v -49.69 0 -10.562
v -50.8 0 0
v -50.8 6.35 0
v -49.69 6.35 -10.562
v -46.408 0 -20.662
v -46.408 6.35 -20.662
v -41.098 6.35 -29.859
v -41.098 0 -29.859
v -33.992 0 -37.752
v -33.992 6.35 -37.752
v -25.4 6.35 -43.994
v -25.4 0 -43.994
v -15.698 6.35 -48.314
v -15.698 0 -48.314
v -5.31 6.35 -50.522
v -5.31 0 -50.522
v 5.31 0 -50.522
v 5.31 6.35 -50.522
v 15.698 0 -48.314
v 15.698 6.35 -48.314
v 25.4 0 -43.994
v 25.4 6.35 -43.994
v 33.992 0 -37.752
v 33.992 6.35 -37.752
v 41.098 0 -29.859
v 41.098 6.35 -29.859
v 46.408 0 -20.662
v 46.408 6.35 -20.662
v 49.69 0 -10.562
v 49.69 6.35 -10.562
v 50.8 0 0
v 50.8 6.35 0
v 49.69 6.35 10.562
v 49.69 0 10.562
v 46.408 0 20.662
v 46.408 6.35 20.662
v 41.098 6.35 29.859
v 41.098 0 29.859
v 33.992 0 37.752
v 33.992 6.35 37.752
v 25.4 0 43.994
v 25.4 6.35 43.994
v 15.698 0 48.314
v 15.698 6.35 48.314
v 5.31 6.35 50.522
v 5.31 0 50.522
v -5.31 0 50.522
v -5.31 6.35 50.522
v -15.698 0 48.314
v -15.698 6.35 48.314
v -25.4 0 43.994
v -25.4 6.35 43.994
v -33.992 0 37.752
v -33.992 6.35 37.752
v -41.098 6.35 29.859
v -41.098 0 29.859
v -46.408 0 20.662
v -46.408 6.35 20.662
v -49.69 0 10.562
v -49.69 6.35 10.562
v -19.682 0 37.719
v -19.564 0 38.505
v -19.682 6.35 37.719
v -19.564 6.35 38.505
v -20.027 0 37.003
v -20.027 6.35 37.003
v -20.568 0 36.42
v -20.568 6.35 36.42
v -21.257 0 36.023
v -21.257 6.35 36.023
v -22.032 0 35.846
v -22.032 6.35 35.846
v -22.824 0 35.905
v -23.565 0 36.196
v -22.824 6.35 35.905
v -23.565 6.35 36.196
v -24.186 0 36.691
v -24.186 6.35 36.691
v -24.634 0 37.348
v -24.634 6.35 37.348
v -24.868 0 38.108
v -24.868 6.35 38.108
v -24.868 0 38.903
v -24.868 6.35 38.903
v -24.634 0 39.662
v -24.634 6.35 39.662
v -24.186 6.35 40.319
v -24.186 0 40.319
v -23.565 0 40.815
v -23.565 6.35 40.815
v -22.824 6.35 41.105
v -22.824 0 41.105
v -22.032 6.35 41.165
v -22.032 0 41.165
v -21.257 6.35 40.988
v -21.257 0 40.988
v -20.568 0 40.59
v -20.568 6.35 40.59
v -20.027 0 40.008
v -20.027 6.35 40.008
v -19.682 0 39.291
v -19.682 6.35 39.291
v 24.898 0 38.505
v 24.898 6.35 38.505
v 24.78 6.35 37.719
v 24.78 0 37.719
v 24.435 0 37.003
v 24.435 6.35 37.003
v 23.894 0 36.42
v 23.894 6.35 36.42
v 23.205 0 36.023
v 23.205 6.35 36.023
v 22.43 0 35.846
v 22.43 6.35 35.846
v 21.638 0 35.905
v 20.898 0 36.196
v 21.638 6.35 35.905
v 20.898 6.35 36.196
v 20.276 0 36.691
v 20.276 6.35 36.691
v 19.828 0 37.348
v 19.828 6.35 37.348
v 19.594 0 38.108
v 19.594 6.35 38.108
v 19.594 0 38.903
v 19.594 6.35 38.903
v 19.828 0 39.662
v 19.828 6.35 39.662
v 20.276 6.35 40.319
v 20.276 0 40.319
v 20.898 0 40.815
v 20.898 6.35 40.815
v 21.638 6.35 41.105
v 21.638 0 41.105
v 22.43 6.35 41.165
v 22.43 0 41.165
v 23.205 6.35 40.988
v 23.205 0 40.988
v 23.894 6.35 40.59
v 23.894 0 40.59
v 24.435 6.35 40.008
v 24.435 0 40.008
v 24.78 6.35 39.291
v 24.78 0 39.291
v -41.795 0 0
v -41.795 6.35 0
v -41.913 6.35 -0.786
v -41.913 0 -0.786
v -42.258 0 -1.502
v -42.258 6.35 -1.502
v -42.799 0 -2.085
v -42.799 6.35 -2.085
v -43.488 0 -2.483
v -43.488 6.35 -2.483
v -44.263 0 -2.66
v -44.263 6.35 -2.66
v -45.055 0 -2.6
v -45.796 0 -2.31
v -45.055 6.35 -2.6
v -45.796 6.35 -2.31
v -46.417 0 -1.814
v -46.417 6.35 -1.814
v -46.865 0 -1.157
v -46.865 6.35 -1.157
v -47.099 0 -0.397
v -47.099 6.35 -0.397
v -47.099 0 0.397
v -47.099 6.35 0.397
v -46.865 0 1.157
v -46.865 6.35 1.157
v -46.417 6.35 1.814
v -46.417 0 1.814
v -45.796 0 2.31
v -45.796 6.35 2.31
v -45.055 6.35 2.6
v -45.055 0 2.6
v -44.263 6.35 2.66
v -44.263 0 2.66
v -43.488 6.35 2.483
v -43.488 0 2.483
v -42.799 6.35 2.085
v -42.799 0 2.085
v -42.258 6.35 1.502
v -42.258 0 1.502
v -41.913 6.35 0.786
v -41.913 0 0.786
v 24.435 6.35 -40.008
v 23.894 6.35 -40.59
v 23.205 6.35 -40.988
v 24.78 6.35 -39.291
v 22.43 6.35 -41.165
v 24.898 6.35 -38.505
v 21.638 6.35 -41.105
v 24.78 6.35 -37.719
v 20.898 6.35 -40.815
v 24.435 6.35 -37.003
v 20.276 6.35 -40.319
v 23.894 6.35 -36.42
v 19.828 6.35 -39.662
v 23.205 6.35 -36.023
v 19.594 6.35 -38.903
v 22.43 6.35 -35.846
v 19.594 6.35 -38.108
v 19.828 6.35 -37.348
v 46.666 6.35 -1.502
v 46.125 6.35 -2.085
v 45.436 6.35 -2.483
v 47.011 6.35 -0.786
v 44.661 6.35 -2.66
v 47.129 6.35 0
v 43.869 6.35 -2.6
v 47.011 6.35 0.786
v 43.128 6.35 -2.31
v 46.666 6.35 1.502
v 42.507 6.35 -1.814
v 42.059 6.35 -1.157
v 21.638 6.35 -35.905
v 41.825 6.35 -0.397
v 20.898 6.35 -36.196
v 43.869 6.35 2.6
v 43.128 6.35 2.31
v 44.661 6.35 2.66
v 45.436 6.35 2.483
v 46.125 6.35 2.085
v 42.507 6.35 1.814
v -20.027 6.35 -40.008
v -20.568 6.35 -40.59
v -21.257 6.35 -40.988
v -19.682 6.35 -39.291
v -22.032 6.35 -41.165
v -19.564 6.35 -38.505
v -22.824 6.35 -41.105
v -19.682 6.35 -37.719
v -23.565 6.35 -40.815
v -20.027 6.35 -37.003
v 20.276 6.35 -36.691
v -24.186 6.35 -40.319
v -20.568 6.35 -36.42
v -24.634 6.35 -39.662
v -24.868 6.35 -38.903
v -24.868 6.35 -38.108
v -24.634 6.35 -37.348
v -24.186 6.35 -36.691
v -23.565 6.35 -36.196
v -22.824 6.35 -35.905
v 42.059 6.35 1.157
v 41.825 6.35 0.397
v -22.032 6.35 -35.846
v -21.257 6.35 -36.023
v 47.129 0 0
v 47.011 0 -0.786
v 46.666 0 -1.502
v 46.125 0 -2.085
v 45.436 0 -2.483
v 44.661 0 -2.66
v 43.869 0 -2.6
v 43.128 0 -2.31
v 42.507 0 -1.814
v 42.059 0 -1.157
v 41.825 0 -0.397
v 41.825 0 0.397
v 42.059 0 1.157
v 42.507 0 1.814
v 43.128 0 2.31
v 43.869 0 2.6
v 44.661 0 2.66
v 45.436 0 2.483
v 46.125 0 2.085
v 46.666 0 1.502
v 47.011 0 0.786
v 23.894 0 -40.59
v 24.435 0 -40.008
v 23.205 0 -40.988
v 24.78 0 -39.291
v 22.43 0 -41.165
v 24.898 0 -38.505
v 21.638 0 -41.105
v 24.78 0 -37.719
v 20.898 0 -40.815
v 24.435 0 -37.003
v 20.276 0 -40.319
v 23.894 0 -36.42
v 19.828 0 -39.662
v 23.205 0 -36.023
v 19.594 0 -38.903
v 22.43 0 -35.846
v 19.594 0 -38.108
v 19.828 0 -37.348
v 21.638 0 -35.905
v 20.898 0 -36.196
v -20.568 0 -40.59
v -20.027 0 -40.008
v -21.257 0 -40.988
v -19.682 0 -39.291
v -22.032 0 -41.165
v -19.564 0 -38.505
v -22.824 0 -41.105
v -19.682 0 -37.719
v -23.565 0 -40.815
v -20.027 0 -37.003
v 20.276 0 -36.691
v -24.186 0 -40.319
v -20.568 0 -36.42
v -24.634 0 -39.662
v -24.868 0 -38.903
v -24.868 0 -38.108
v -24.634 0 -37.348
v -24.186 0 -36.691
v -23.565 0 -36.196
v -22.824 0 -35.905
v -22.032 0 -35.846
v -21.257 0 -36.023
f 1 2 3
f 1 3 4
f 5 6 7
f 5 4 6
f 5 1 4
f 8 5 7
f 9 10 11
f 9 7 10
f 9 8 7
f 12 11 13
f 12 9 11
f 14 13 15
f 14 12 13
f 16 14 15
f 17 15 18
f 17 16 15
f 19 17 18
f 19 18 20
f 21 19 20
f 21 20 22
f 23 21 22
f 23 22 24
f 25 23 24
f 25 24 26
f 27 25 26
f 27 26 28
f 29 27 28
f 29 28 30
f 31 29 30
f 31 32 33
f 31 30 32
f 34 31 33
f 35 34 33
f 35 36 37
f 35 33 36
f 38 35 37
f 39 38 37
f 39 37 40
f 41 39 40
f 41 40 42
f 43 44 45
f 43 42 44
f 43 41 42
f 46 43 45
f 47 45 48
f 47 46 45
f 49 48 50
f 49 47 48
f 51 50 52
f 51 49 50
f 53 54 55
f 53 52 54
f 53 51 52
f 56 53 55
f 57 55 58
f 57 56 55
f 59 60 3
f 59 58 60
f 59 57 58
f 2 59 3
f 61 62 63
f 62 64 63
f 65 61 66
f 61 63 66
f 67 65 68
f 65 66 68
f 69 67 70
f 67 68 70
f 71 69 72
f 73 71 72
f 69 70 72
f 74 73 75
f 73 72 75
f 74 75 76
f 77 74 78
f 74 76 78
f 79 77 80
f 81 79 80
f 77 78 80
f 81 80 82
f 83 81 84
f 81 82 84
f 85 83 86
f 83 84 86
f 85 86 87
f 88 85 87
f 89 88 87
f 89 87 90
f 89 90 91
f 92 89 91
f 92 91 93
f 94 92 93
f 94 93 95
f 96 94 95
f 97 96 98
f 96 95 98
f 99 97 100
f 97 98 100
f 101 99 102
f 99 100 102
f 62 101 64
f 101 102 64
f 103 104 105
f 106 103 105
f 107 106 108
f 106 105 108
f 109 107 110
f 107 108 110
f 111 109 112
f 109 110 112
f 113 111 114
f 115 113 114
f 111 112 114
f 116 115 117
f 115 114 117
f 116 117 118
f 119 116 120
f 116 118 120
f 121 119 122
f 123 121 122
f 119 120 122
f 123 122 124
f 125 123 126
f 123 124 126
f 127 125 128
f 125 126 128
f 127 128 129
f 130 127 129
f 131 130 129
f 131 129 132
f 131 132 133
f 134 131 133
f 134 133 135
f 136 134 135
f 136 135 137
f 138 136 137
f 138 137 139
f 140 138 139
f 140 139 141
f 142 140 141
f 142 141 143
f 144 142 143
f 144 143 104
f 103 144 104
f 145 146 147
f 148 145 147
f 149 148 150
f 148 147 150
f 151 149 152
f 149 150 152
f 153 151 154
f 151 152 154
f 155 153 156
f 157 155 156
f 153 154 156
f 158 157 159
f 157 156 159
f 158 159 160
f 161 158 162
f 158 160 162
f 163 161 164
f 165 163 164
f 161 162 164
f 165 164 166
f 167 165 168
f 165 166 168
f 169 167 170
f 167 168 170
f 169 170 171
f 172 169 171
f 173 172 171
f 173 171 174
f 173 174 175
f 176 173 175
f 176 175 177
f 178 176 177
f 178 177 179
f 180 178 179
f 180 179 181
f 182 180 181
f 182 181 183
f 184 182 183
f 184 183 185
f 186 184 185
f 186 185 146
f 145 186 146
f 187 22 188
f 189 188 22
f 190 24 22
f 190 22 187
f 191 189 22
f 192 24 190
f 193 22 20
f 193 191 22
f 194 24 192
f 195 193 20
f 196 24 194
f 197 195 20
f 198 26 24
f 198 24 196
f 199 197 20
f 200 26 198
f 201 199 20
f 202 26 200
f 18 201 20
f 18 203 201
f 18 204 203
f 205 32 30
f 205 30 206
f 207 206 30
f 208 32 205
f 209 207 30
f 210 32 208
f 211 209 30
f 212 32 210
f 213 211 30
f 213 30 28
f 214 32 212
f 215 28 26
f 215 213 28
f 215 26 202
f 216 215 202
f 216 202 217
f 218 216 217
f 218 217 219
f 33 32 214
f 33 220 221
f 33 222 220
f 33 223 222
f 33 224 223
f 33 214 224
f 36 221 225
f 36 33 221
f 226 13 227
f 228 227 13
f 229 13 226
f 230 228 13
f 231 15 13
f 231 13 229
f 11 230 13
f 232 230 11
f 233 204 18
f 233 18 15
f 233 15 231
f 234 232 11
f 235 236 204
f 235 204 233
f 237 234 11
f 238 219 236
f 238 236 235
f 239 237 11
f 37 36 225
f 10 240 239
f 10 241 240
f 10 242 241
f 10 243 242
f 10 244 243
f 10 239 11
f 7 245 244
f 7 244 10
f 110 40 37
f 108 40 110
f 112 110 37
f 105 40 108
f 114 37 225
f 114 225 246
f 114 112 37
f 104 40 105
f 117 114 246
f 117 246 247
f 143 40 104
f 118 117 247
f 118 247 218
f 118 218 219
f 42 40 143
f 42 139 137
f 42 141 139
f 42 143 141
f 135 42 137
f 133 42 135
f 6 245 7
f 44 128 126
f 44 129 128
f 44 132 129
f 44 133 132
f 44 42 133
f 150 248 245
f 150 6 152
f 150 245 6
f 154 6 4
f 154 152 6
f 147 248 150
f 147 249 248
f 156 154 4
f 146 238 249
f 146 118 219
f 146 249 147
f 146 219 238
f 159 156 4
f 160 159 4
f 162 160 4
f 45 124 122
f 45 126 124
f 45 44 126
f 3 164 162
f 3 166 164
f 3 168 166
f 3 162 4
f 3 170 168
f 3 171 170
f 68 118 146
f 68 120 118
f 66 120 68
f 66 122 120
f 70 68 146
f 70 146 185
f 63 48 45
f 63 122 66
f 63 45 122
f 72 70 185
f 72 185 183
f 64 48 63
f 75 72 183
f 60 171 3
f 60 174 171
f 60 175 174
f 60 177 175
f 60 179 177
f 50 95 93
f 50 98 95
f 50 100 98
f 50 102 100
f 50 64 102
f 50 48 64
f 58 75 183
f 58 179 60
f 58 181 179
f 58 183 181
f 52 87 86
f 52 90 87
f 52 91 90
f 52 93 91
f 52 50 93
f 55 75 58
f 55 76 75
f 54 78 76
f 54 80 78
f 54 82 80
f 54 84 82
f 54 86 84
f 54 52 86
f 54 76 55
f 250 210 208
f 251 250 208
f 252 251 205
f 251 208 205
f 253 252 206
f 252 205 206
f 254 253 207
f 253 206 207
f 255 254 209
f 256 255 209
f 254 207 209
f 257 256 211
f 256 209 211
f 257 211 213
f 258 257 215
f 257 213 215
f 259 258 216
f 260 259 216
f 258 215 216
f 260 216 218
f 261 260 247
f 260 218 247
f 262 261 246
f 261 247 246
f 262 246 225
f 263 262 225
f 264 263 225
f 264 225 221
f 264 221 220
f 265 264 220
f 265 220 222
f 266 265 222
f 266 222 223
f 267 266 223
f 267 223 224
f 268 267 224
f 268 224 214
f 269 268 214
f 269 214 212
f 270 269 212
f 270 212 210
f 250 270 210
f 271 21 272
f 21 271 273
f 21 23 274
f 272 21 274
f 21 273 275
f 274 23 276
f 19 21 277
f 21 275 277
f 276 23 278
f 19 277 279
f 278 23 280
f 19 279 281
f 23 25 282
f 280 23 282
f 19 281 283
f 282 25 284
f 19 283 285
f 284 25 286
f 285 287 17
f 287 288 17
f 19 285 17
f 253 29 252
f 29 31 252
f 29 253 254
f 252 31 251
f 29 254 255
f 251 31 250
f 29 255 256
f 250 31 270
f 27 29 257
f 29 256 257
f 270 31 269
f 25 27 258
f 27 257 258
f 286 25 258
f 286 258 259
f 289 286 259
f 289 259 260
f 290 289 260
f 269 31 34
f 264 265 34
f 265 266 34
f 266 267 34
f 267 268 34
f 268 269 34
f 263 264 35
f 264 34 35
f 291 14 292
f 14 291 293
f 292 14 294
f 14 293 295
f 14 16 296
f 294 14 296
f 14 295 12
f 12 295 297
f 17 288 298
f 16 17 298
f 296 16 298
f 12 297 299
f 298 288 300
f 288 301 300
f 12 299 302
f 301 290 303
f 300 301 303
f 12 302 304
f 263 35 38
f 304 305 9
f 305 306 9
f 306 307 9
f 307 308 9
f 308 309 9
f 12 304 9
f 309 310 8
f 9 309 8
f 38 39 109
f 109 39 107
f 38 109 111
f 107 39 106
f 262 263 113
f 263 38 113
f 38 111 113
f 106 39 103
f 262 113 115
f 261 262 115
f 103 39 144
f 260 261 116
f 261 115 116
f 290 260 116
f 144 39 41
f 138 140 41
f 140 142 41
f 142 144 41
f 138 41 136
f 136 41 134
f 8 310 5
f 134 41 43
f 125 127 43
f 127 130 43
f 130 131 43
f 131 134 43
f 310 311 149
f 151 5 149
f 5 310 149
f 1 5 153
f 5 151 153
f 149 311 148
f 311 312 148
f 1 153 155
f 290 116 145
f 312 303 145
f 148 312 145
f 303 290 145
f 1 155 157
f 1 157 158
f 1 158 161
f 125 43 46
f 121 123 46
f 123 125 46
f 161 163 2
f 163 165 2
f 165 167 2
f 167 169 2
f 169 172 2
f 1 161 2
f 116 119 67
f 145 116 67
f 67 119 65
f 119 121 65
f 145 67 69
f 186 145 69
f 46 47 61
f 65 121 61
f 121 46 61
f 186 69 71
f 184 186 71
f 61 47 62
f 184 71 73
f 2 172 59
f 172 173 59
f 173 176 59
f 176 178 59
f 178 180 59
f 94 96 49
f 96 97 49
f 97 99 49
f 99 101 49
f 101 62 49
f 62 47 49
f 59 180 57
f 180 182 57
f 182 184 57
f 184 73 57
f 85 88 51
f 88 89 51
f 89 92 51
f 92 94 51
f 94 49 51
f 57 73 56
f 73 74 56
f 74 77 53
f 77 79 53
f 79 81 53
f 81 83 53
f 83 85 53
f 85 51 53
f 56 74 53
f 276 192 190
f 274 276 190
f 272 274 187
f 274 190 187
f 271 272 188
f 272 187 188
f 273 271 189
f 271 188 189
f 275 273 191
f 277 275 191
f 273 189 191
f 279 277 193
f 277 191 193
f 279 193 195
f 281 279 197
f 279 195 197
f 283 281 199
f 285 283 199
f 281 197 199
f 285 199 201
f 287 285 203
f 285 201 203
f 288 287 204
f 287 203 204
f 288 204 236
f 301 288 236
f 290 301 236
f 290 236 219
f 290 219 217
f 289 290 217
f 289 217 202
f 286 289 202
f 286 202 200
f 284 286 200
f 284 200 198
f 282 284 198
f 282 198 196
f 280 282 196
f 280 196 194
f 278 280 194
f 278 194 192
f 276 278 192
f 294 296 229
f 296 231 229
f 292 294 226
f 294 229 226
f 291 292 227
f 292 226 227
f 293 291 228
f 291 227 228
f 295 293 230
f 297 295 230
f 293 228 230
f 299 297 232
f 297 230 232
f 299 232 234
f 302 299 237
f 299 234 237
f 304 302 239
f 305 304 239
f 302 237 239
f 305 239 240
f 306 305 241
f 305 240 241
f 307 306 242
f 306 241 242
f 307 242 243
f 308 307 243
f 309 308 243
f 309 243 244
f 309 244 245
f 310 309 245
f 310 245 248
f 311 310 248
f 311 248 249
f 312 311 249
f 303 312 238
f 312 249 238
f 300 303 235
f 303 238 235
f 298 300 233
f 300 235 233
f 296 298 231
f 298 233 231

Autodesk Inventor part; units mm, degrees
ref_plane "YZ Plane" through (0, 0, 0) normal (1, 0, 0) x (0, 1, 0)
ref_plane "XZ Plane" through (0, 0, 0) normal (0, 1, 0) x (-1, 0, 0)
ref_plane "XY Plane" through (0, 0, 0) normal (0, 0, 1) x (1, 0, 0)
sketch "Sketch4" plane through (0, 0, 0) normal (0, 1, 0) x (-1, 0, 0)
  circle A0 centre (0, 0) radius 50.8
  dimension "d2" = 101.6
extrude "Extrusion3" add sketch "Sketch4" along normal blind 6.35
sketch "Sketch10" plane through (0, 6.35, 0) normal (0, 1, 0) x (1, 0, 0)
  circle A0 centre (-44.462, 0) radius 2.667
  circle A1 centre (-22.231, -38.5052) radius 2.667
  circle A2 centre (22.231, -38.5052) radius 2.667
  circle A3 centre (44.462, 0) radius 2.667
  circle A4 centre (22.231, 38.5052) radius 2.667
  circle A5 centre (-22.231, 38.5052) radius 2.667
  point P0 (0, 0)
  dimension "d48" = 5.334
  dimension "d51" = 360
extrude "Extrusion6" cut sketch "Sketch10" against normal blind 6.35
properties part number "cap"
